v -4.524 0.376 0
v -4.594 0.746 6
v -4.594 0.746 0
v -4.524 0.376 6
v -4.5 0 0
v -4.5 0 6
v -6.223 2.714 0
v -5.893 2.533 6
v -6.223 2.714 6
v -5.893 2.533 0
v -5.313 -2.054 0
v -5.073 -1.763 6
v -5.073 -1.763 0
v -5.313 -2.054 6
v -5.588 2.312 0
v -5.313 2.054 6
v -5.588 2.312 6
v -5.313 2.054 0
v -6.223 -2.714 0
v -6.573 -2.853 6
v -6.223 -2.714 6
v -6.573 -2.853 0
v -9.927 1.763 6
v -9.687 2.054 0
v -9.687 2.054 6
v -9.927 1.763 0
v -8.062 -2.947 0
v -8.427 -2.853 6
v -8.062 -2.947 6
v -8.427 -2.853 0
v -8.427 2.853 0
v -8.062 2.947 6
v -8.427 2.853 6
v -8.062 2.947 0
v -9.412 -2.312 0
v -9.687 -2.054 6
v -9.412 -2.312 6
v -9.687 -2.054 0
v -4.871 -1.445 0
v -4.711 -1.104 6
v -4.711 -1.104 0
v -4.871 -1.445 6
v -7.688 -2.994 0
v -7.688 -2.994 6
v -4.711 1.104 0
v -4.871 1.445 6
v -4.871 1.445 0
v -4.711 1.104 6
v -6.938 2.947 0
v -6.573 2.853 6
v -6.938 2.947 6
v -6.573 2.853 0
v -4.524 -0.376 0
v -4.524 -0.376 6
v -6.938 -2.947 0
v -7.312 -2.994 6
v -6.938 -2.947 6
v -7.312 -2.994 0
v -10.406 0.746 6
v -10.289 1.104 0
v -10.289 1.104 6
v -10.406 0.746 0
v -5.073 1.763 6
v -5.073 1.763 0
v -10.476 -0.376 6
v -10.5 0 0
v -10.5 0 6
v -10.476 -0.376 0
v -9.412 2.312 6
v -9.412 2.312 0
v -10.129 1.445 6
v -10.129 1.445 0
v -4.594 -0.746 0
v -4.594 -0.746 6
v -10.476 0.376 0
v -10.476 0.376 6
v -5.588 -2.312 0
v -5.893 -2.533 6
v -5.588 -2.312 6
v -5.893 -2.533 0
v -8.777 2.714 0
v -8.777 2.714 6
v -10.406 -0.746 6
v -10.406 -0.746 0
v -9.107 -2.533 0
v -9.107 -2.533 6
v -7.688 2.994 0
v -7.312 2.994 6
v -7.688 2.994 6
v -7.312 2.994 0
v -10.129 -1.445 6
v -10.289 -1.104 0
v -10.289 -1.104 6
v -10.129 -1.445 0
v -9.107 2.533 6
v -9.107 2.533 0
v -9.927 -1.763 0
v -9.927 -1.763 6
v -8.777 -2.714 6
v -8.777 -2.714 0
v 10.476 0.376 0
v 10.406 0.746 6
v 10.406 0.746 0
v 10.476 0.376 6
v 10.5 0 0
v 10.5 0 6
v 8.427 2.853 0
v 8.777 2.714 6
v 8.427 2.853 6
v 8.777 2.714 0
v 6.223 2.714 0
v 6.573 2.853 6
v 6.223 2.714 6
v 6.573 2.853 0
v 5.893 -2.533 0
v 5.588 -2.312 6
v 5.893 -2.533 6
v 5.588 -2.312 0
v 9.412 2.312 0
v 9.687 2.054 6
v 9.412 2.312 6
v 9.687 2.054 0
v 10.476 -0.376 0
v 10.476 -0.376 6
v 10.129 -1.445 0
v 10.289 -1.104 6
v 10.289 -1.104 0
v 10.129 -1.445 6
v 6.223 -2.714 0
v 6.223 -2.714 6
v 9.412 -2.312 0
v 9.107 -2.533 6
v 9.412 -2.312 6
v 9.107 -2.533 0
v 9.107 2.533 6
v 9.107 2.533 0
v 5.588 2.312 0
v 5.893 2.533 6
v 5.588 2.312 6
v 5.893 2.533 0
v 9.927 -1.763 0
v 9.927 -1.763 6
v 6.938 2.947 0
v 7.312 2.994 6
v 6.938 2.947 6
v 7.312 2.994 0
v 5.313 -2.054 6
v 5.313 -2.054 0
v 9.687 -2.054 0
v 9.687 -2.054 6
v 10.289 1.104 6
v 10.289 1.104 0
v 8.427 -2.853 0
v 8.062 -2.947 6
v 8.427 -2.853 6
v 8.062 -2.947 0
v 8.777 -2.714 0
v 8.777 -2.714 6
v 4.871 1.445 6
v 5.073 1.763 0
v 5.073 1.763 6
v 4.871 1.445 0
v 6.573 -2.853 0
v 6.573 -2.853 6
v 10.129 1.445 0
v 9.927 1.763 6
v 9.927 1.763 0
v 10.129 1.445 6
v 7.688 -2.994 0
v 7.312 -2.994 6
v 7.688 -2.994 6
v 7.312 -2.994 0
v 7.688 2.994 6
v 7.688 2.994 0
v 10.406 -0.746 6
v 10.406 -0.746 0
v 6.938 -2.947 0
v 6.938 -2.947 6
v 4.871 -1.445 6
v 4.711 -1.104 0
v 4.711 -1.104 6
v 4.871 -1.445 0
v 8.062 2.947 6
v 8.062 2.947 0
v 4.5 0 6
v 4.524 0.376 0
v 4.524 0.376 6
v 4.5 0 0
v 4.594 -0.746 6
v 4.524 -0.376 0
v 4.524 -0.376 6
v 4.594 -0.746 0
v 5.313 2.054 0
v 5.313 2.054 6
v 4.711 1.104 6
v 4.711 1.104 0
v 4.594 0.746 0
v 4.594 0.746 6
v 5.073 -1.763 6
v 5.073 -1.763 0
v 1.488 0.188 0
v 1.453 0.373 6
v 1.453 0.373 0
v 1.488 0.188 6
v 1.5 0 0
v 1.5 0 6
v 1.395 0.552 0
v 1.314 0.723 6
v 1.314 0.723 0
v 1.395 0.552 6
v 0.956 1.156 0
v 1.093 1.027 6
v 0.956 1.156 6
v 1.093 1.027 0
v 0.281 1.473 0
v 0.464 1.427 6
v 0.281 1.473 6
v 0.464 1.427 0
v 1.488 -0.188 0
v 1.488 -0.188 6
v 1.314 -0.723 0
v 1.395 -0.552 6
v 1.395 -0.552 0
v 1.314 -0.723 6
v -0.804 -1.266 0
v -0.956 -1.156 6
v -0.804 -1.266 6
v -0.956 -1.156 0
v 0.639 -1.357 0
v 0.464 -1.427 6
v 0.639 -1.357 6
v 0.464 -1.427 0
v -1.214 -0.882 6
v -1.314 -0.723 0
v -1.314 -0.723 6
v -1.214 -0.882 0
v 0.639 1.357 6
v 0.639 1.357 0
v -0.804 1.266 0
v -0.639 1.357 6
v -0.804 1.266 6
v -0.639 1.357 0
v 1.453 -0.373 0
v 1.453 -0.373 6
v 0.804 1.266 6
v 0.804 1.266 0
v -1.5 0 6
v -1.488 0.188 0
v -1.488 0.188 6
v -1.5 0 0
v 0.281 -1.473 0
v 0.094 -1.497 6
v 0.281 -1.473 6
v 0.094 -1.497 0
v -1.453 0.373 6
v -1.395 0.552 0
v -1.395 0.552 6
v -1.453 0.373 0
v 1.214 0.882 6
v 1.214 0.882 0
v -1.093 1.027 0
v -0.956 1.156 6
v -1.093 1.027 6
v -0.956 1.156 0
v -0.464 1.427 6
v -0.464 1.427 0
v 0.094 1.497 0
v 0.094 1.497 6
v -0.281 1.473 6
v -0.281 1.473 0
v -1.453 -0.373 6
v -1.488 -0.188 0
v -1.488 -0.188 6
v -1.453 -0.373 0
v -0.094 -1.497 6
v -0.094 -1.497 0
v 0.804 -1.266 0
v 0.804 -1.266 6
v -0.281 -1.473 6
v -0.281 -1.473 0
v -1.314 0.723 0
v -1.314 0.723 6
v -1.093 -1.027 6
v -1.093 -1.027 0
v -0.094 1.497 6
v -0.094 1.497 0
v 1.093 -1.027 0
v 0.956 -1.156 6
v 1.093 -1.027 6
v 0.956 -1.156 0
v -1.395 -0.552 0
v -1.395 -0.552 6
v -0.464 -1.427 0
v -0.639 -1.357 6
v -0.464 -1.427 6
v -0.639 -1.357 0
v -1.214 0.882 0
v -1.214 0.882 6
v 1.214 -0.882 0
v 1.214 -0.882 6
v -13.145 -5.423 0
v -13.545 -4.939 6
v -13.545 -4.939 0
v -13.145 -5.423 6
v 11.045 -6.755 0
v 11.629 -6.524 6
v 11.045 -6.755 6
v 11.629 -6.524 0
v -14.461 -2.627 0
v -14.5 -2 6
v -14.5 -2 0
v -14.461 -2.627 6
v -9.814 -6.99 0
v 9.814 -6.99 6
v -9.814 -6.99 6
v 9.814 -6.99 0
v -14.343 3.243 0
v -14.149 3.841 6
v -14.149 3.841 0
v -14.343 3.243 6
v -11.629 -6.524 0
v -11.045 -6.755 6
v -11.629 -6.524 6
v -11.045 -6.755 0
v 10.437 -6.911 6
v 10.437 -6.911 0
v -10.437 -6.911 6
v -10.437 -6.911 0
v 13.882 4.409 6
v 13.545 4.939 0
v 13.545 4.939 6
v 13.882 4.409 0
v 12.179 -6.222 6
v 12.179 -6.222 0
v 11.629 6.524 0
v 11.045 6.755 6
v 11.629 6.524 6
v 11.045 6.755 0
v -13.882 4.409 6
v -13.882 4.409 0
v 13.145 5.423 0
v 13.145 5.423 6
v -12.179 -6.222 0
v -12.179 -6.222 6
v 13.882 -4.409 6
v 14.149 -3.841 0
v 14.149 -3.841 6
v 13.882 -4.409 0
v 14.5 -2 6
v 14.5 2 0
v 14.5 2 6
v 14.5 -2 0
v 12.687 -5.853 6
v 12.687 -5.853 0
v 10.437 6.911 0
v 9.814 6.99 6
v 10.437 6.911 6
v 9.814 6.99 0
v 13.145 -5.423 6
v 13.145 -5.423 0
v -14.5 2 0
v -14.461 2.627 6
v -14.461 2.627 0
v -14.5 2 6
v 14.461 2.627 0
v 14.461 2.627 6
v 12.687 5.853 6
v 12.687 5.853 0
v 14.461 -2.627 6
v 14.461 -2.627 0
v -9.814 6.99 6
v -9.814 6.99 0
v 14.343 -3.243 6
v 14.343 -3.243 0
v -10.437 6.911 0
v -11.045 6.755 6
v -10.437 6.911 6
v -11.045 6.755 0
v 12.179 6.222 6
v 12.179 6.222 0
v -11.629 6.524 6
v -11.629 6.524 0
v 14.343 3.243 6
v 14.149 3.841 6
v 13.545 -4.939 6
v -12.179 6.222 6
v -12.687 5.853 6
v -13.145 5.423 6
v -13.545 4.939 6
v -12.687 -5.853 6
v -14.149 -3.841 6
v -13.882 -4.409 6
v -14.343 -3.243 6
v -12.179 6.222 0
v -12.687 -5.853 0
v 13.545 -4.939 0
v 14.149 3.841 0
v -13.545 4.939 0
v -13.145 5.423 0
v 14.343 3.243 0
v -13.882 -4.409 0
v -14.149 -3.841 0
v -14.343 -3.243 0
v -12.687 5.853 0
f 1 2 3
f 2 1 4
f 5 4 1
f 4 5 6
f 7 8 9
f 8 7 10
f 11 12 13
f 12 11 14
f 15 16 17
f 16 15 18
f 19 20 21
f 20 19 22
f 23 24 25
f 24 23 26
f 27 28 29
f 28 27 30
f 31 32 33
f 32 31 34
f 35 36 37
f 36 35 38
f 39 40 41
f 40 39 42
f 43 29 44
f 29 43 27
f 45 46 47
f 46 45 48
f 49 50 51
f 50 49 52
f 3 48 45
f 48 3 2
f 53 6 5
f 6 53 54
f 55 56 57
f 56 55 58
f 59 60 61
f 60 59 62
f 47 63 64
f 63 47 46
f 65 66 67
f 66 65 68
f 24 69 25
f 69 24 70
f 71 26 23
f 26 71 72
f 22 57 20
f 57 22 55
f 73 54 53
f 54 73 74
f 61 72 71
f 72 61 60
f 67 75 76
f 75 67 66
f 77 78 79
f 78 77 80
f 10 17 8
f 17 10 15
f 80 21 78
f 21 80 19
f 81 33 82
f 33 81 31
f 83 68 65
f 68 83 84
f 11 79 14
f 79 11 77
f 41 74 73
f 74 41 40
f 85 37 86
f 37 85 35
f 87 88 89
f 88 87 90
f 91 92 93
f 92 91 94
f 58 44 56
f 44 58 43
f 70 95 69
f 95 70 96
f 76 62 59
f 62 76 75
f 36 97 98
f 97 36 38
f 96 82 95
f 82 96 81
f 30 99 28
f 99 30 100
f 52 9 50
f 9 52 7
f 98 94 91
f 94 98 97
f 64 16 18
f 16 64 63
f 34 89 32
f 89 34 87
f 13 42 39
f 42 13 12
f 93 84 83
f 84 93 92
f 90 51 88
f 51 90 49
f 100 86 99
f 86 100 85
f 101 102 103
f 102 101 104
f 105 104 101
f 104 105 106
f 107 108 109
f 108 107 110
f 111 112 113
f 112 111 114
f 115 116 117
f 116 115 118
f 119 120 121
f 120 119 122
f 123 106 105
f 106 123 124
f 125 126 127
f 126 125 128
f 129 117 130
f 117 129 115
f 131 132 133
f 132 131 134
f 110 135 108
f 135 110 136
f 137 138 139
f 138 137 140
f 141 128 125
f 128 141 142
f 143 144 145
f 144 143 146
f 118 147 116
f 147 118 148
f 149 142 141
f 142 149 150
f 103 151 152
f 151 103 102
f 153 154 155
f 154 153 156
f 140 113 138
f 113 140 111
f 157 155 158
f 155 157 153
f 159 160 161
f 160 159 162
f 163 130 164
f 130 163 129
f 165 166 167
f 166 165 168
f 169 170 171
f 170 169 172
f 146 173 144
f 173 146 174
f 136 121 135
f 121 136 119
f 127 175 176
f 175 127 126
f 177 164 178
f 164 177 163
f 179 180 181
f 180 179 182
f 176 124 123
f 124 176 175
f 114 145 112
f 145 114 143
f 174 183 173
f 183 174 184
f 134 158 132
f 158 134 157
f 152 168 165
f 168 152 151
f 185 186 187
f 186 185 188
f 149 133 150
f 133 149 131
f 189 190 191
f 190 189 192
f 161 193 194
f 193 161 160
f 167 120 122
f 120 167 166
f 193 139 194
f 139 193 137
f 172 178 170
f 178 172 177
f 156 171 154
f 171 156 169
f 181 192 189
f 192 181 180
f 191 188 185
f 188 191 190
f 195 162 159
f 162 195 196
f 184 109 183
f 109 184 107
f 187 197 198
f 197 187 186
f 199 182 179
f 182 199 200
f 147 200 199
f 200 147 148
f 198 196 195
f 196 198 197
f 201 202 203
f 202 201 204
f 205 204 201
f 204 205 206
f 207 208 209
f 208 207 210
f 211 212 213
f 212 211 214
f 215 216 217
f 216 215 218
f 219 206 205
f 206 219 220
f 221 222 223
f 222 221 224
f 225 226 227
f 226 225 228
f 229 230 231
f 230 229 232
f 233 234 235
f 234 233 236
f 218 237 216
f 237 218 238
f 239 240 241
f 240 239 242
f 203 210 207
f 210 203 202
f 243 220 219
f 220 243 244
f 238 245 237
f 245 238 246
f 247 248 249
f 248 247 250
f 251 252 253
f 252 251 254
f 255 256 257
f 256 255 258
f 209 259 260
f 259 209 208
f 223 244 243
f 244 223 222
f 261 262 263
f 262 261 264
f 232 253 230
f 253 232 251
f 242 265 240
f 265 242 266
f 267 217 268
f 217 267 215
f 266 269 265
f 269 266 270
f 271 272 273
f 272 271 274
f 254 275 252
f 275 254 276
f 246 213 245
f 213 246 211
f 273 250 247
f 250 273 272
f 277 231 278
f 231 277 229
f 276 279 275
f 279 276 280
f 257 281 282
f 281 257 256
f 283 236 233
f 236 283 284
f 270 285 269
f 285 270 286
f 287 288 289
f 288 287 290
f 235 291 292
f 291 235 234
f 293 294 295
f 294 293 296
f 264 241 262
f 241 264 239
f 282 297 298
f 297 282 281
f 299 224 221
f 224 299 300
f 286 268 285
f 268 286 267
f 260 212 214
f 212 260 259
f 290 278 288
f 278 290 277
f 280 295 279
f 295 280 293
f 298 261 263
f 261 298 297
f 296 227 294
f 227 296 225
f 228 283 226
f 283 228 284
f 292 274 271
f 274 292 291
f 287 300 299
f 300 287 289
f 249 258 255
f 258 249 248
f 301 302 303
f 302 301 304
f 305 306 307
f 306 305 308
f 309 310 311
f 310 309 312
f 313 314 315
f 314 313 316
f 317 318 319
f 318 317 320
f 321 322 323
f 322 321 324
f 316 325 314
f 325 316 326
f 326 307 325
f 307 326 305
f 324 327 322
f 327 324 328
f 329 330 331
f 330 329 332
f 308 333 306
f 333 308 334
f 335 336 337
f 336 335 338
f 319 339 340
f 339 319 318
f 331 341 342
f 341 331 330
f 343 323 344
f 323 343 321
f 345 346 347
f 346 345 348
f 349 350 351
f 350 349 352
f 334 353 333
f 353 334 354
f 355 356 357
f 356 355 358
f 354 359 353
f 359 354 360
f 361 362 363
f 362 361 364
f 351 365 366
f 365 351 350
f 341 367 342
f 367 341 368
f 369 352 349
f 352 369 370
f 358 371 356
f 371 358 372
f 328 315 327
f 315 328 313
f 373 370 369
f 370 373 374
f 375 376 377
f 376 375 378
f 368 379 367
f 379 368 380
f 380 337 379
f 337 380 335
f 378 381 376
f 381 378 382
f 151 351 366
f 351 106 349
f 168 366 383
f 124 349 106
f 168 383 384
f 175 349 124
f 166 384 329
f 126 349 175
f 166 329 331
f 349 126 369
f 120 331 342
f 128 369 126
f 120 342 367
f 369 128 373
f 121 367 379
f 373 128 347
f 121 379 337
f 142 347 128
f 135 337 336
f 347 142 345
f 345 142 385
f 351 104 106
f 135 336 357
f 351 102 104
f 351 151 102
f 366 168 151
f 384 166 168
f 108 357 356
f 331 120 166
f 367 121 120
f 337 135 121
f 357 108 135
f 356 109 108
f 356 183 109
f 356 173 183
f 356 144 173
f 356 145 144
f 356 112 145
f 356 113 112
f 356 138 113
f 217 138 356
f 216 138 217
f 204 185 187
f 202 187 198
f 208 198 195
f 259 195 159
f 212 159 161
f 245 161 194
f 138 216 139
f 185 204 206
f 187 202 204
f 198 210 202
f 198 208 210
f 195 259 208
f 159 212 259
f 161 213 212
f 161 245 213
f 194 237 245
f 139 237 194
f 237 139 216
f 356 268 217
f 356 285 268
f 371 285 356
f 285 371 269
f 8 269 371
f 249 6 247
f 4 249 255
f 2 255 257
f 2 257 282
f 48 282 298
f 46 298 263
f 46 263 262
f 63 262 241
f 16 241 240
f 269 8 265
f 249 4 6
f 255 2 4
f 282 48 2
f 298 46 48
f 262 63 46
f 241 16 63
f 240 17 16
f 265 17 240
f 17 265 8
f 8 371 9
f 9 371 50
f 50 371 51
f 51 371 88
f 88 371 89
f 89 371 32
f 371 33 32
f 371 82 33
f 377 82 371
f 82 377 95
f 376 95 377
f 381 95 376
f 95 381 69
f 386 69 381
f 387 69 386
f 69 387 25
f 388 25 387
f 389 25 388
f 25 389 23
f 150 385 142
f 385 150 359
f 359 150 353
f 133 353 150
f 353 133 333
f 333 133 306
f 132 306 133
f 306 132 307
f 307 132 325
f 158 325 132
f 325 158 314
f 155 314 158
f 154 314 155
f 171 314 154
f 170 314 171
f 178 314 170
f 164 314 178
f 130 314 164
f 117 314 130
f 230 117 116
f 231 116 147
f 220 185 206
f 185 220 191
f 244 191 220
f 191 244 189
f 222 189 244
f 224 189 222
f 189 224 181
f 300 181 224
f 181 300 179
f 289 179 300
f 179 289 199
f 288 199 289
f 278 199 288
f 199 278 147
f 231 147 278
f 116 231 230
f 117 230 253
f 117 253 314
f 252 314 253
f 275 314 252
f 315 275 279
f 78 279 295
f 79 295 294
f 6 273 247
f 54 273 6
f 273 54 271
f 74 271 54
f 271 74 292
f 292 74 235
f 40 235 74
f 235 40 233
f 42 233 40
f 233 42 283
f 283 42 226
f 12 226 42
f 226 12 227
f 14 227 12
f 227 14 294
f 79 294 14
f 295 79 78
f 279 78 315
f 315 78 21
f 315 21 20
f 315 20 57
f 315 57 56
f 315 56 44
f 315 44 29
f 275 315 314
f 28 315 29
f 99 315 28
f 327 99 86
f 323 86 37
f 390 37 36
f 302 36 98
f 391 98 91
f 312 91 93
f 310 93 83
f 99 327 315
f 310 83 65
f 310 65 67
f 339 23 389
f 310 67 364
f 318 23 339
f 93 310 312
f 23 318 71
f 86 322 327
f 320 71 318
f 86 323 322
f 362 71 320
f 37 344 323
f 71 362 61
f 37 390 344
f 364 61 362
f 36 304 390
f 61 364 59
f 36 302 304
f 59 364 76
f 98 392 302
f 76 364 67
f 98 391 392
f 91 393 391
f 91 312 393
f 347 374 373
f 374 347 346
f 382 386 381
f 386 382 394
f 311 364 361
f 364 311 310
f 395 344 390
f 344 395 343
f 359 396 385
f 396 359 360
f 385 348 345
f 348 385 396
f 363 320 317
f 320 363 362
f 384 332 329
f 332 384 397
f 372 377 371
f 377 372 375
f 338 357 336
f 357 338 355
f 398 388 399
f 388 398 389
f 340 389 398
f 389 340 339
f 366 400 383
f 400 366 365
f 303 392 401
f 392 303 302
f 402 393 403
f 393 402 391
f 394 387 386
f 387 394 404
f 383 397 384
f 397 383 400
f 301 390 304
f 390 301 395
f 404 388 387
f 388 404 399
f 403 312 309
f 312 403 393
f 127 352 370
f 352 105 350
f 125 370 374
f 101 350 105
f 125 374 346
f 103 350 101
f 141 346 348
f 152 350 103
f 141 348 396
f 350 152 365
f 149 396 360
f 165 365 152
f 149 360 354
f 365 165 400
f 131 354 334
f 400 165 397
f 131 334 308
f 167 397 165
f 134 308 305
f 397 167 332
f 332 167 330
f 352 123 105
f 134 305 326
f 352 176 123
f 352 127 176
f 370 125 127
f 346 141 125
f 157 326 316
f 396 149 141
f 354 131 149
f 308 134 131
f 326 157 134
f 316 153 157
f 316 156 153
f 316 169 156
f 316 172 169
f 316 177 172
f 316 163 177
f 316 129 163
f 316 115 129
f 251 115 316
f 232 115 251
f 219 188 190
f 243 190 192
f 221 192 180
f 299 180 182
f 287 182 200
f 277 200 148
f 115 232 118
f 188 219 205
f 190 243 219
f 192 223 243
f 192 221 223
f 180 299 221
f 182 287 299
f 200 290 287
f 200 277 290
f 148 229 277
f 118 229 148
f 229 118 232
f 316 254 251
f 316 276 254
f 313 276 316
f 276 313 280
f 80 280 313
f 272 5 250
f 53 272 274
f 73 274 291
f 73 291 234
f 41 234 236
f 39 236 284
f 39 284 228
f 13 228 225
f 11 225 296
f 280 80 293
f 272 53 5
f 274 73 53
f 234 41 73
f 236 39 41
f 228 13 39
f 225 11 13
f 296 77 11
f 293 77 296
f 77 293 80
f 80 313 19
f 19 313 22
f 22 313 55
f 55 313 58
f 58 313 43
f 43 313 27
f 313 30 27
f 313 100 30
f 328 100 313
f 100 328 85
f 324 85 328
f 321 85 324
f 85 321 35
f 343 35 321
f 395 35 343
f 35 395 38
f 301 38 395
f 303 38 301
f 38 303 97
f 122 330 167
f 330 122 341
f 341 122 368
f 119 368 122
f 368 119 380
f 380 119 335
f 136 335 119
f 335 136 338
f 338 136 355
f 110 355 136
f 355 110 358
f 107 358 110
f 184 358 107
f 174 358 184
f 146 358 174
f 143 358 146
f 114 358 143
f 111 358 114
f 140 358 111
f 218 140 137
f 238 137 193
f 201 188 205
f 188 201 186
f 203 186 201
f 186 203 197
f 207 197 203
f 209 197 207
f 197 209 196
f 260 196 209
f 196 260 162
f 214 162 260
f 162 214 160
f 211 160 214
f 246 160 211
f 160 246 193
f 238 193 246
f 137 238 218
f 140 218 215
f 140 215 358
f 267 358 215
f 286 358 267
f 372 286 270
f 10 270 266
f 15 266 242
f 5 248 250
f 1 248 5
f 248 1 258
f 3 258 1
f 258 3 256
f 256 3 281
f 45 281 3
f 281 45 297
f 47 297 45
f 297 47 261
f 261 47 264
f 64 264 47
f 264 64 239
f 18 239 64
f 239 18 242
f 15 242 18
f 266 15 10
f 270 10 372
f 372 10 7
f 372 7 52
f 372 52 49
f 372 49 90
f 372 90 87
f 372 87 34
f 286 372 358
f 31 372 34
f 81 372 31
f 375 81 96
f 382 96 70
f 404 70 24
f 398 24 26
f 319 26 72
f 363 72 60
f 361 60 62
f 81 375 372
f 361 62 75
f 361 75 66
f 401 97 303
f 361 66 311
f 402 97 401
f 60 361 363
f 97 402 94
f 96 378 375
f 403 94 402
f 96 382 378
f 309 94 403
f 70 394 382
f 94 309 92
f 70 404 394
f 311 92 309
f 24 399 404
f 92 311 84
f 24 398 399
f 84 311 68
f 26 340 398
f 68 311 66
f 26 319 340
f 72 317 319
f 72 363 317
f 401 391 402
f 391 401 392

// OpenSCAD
$fn = 50;


difference() {
	union() {
		*color(alpha = 1.0000000000, c = "gray") {
			translate(v = [0, 7, 0]) {
				linear_extrude(height = 1) {
					text(font = "Arial:style=Bold", halign = "center", size = 4.5000000000, text = "COMMENT plate main", valign = "center");
				}
			}
		}
		hull() {
			translate(v = [-9.5000000000, 2.0000000000, 0]) {
				cylinder(h = 6, r = 5);
			}
			translate(v = [9.5000000000, 2.0000000000, 0]) {
				cylinder(h = 6, r = 5);
			}
			translate(v = [-9.5000000000, -2.0000000000, 0]) {
				cylinder(h = 6, r = 5);
			}
			translate(v = [9.5000000000, -2.0000000000, 0]) {
				cylinder(h = 6, r = 5);
			}
		}
	}
	union() {
		*color(alpha = 1.0000000000, c = "gray") {
			translate(v = [0, 7, 0]) {
				linear_extrude(height = 1) {
					text(font = "Arial:style=Bold", halign = "center", size = 4.5000000000, text = "COMMENT holes main", valign = "center");
				}
			}
		}
		translate(v = [-7.5000000000, 0.0000000000, 0]) {
			translate(v = [0, 0, -100]) {
				cylinder(h = 200, r = 3.0000000000);
			}
		}
		translate(v = [7.5000000000, 0.0000000000, 0]) {
			translate(v = [0, 0, -100]) {
				cylinder(h = 200, r = 3.0000000000);
			}
		}
		translate(v = [-7.5000000000, 0.0000000000, 0]) {
			translate(v = [0, 0, -100]) {
				cylinder(h = 200, r = 1.5000000000);
			}
		}
		translate(v = [0, 0, -100]) {
			cylinder(h = 200, r = 1.5000000000);
		}
		translate(v = [7.5000000000, 0.0000000000, 0]) {
			translate(v = [0, 0, -100]) {
				cylinder(h = 200, r = 1.5000000000);
			}
		}
	}
}
